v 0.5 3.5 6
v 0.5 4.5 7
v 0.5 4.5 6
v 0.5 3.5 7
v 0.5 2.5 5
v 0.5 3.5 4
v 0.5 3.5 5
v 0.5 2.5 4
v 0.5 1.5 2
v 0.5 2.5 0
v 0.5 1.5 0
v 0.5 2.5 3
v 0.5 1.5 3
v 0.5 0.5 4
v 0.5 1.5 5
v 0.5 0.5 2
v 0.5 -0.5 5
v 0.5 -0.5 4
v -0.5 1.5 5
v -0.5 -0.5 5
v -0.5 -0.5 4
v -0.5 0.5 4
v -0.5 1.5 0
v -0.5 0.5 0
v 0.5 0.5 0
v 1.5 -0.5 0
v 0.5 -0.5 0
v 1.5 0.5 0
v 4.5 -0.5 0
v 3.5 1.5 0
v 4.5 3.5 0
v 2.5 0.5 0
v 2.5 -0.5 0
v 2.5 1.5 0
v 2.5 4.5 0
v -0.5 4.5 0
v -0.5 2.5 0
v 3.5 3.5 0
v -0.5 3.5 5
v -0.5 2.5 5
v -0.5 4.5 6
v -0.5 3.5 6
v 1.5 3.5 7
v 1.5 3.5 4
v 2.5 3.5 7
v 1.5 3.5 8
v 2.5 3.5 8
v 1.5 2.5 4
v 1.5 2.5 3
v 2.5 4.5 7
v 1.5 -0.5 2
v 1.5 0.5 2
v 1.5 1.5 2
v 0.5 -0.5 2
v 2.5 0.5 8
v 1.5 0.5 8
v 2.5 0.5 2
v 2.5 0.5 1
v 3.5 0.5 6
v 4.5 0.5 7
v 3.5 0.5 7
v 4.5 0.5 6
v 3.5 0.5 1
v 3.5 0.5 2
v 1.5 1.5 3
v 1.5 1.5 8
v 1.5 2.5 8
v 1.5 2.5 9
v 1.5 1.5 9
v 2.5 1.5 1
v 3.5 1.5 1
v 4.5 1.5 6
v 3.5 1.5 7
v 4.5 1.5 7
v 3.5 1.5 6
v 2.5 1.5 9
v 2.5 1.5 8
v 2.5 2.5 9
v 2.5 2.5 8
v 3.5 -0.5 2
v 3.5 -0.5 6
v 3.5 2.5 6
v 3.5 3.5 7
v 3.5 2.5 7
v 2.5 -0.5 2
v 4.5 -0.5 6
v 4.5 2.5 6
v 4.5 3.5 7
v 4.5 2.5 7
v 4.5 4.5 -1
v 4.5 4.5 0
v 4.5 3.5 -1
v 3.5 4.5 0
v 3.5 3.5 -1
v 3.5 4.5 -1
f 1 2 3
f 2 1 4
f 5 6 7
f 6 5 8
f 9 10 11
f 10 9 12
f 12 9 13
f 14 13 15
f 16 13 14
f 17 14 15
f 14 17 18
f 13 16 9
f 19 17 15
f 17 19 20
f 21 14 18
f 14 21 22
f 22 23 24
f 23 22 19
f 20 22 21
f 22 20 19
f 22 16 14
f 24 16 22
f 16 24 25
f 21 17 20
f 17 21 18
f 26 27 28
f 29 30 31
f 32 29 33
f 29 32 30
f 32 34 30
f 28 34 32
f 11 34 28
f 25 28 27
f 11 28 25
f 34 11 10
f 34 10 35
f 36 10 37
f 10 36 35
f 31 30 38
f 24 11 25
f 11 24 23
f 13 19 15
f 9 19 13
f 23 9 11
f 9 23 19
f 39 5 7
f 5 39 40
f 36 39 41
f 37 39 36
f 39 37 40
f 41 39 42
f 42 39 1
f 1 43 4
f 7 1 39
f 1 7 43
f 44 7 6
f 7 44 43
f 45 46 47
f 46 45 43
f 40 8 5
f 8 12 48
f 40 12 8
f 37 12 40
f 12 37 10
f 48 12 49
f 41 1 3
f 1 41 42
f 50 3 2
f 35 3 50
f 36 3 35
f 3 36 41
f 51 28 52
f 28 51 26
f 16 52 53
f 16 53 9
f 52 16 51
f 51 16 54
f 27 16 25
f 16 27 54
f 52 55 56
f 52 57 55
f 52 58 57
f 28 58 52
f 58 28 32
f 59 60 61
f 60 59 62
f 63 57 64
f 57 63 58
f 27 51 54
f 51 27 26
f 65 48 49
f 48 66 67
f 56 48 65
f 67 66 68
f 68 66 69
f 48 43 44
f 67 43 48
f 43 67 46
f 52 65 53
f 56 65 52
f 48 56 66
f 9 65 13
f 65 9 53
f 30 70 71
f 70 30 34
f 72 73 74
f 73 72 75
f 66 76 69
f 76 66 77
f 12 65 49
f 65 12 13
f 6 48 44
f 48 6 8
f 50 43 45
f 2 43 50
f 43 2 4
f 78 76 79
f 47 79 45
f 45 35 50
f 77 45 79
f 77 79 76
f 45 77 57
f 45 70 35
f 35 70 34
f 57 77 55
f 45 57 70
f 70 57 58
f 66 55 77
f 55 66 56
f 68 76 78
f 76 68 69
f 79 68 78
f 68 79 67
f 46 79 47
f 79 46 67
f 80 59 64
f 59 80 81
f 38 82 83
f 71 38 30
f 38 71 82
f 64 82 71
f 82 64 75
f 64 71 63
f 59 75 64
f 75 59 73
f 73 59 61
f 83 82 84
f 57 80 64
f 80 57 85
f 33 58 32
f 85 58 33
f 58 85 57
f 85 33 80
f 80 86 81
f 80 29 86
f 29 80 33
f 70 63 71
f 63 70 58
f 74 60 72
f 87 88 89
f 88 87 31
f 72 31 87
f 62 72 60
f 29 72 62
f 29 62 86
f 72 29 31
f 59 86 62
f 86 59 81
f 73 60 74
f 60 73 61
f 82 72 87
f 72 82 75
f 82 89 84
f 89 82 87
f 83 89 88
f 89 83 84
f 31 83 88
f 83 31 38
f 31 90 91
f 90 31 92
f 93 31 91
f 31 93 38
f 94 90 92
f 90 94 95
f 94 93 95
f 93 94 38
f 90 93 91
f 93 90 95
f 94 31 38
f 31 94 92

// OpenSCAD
union() {
    translate([0, 0, 4.5]) color([1, 0, 0]) cube([1, 1, 1], center=true);
    translate([0, 1, 2.5]) cube([1, 1, 5], center=true);
    translate([0, 3, 2.5]) cube([1, 1, 5], center=true);
    translate([0, 4, 3.0]) cube([1, 1, 6], center=true);
    translate([1, 0, 1.0]) cube([1, 1, 2], center=true);
    translate([1, 1, 1.0]) cube([1, 1, 2], center=true);
    translate([1, 2, 1.5]) cube([1, 1, 3], center=true);
    translate([1, 3, 2.0]) cube([1, 1, 4], center=true);
    translate([1, 4, 3.5]) cube([1, 1, 7], center=true);
    translate([2, 1, 4.0]) cube([1, 1, 8], center=true);
    translate([2, 2, 4.5]) cube([1, 1, 9], center=true);
    translate([2, 3, 4.0]) cube([1, 1, 8], center=true);
    translate([2, 4, 3.5]) cube([1, 1, 7], center=true);
    translate([3, 0, 1.0]) cube([1, 1, 2], center=true);
    translate([3, 1, 0.5]) cube([1, 1, 1], center=true);
    translate([4, 0, 3.0]) cube([1, 1, 6], center=true);
    translate([4, 1, 3.5]) cube([1, 1, 7], center=true);
    translate([4, 2, 3.0]) cube([1, 1, 6], center=true);
    translate([4, 3, 3.5]) cube([1, 1, 7], center=true);
    translate([4, 4, -0.5]) color([0, 0, 1]) cube([1, 1, 1], center=true);
}
